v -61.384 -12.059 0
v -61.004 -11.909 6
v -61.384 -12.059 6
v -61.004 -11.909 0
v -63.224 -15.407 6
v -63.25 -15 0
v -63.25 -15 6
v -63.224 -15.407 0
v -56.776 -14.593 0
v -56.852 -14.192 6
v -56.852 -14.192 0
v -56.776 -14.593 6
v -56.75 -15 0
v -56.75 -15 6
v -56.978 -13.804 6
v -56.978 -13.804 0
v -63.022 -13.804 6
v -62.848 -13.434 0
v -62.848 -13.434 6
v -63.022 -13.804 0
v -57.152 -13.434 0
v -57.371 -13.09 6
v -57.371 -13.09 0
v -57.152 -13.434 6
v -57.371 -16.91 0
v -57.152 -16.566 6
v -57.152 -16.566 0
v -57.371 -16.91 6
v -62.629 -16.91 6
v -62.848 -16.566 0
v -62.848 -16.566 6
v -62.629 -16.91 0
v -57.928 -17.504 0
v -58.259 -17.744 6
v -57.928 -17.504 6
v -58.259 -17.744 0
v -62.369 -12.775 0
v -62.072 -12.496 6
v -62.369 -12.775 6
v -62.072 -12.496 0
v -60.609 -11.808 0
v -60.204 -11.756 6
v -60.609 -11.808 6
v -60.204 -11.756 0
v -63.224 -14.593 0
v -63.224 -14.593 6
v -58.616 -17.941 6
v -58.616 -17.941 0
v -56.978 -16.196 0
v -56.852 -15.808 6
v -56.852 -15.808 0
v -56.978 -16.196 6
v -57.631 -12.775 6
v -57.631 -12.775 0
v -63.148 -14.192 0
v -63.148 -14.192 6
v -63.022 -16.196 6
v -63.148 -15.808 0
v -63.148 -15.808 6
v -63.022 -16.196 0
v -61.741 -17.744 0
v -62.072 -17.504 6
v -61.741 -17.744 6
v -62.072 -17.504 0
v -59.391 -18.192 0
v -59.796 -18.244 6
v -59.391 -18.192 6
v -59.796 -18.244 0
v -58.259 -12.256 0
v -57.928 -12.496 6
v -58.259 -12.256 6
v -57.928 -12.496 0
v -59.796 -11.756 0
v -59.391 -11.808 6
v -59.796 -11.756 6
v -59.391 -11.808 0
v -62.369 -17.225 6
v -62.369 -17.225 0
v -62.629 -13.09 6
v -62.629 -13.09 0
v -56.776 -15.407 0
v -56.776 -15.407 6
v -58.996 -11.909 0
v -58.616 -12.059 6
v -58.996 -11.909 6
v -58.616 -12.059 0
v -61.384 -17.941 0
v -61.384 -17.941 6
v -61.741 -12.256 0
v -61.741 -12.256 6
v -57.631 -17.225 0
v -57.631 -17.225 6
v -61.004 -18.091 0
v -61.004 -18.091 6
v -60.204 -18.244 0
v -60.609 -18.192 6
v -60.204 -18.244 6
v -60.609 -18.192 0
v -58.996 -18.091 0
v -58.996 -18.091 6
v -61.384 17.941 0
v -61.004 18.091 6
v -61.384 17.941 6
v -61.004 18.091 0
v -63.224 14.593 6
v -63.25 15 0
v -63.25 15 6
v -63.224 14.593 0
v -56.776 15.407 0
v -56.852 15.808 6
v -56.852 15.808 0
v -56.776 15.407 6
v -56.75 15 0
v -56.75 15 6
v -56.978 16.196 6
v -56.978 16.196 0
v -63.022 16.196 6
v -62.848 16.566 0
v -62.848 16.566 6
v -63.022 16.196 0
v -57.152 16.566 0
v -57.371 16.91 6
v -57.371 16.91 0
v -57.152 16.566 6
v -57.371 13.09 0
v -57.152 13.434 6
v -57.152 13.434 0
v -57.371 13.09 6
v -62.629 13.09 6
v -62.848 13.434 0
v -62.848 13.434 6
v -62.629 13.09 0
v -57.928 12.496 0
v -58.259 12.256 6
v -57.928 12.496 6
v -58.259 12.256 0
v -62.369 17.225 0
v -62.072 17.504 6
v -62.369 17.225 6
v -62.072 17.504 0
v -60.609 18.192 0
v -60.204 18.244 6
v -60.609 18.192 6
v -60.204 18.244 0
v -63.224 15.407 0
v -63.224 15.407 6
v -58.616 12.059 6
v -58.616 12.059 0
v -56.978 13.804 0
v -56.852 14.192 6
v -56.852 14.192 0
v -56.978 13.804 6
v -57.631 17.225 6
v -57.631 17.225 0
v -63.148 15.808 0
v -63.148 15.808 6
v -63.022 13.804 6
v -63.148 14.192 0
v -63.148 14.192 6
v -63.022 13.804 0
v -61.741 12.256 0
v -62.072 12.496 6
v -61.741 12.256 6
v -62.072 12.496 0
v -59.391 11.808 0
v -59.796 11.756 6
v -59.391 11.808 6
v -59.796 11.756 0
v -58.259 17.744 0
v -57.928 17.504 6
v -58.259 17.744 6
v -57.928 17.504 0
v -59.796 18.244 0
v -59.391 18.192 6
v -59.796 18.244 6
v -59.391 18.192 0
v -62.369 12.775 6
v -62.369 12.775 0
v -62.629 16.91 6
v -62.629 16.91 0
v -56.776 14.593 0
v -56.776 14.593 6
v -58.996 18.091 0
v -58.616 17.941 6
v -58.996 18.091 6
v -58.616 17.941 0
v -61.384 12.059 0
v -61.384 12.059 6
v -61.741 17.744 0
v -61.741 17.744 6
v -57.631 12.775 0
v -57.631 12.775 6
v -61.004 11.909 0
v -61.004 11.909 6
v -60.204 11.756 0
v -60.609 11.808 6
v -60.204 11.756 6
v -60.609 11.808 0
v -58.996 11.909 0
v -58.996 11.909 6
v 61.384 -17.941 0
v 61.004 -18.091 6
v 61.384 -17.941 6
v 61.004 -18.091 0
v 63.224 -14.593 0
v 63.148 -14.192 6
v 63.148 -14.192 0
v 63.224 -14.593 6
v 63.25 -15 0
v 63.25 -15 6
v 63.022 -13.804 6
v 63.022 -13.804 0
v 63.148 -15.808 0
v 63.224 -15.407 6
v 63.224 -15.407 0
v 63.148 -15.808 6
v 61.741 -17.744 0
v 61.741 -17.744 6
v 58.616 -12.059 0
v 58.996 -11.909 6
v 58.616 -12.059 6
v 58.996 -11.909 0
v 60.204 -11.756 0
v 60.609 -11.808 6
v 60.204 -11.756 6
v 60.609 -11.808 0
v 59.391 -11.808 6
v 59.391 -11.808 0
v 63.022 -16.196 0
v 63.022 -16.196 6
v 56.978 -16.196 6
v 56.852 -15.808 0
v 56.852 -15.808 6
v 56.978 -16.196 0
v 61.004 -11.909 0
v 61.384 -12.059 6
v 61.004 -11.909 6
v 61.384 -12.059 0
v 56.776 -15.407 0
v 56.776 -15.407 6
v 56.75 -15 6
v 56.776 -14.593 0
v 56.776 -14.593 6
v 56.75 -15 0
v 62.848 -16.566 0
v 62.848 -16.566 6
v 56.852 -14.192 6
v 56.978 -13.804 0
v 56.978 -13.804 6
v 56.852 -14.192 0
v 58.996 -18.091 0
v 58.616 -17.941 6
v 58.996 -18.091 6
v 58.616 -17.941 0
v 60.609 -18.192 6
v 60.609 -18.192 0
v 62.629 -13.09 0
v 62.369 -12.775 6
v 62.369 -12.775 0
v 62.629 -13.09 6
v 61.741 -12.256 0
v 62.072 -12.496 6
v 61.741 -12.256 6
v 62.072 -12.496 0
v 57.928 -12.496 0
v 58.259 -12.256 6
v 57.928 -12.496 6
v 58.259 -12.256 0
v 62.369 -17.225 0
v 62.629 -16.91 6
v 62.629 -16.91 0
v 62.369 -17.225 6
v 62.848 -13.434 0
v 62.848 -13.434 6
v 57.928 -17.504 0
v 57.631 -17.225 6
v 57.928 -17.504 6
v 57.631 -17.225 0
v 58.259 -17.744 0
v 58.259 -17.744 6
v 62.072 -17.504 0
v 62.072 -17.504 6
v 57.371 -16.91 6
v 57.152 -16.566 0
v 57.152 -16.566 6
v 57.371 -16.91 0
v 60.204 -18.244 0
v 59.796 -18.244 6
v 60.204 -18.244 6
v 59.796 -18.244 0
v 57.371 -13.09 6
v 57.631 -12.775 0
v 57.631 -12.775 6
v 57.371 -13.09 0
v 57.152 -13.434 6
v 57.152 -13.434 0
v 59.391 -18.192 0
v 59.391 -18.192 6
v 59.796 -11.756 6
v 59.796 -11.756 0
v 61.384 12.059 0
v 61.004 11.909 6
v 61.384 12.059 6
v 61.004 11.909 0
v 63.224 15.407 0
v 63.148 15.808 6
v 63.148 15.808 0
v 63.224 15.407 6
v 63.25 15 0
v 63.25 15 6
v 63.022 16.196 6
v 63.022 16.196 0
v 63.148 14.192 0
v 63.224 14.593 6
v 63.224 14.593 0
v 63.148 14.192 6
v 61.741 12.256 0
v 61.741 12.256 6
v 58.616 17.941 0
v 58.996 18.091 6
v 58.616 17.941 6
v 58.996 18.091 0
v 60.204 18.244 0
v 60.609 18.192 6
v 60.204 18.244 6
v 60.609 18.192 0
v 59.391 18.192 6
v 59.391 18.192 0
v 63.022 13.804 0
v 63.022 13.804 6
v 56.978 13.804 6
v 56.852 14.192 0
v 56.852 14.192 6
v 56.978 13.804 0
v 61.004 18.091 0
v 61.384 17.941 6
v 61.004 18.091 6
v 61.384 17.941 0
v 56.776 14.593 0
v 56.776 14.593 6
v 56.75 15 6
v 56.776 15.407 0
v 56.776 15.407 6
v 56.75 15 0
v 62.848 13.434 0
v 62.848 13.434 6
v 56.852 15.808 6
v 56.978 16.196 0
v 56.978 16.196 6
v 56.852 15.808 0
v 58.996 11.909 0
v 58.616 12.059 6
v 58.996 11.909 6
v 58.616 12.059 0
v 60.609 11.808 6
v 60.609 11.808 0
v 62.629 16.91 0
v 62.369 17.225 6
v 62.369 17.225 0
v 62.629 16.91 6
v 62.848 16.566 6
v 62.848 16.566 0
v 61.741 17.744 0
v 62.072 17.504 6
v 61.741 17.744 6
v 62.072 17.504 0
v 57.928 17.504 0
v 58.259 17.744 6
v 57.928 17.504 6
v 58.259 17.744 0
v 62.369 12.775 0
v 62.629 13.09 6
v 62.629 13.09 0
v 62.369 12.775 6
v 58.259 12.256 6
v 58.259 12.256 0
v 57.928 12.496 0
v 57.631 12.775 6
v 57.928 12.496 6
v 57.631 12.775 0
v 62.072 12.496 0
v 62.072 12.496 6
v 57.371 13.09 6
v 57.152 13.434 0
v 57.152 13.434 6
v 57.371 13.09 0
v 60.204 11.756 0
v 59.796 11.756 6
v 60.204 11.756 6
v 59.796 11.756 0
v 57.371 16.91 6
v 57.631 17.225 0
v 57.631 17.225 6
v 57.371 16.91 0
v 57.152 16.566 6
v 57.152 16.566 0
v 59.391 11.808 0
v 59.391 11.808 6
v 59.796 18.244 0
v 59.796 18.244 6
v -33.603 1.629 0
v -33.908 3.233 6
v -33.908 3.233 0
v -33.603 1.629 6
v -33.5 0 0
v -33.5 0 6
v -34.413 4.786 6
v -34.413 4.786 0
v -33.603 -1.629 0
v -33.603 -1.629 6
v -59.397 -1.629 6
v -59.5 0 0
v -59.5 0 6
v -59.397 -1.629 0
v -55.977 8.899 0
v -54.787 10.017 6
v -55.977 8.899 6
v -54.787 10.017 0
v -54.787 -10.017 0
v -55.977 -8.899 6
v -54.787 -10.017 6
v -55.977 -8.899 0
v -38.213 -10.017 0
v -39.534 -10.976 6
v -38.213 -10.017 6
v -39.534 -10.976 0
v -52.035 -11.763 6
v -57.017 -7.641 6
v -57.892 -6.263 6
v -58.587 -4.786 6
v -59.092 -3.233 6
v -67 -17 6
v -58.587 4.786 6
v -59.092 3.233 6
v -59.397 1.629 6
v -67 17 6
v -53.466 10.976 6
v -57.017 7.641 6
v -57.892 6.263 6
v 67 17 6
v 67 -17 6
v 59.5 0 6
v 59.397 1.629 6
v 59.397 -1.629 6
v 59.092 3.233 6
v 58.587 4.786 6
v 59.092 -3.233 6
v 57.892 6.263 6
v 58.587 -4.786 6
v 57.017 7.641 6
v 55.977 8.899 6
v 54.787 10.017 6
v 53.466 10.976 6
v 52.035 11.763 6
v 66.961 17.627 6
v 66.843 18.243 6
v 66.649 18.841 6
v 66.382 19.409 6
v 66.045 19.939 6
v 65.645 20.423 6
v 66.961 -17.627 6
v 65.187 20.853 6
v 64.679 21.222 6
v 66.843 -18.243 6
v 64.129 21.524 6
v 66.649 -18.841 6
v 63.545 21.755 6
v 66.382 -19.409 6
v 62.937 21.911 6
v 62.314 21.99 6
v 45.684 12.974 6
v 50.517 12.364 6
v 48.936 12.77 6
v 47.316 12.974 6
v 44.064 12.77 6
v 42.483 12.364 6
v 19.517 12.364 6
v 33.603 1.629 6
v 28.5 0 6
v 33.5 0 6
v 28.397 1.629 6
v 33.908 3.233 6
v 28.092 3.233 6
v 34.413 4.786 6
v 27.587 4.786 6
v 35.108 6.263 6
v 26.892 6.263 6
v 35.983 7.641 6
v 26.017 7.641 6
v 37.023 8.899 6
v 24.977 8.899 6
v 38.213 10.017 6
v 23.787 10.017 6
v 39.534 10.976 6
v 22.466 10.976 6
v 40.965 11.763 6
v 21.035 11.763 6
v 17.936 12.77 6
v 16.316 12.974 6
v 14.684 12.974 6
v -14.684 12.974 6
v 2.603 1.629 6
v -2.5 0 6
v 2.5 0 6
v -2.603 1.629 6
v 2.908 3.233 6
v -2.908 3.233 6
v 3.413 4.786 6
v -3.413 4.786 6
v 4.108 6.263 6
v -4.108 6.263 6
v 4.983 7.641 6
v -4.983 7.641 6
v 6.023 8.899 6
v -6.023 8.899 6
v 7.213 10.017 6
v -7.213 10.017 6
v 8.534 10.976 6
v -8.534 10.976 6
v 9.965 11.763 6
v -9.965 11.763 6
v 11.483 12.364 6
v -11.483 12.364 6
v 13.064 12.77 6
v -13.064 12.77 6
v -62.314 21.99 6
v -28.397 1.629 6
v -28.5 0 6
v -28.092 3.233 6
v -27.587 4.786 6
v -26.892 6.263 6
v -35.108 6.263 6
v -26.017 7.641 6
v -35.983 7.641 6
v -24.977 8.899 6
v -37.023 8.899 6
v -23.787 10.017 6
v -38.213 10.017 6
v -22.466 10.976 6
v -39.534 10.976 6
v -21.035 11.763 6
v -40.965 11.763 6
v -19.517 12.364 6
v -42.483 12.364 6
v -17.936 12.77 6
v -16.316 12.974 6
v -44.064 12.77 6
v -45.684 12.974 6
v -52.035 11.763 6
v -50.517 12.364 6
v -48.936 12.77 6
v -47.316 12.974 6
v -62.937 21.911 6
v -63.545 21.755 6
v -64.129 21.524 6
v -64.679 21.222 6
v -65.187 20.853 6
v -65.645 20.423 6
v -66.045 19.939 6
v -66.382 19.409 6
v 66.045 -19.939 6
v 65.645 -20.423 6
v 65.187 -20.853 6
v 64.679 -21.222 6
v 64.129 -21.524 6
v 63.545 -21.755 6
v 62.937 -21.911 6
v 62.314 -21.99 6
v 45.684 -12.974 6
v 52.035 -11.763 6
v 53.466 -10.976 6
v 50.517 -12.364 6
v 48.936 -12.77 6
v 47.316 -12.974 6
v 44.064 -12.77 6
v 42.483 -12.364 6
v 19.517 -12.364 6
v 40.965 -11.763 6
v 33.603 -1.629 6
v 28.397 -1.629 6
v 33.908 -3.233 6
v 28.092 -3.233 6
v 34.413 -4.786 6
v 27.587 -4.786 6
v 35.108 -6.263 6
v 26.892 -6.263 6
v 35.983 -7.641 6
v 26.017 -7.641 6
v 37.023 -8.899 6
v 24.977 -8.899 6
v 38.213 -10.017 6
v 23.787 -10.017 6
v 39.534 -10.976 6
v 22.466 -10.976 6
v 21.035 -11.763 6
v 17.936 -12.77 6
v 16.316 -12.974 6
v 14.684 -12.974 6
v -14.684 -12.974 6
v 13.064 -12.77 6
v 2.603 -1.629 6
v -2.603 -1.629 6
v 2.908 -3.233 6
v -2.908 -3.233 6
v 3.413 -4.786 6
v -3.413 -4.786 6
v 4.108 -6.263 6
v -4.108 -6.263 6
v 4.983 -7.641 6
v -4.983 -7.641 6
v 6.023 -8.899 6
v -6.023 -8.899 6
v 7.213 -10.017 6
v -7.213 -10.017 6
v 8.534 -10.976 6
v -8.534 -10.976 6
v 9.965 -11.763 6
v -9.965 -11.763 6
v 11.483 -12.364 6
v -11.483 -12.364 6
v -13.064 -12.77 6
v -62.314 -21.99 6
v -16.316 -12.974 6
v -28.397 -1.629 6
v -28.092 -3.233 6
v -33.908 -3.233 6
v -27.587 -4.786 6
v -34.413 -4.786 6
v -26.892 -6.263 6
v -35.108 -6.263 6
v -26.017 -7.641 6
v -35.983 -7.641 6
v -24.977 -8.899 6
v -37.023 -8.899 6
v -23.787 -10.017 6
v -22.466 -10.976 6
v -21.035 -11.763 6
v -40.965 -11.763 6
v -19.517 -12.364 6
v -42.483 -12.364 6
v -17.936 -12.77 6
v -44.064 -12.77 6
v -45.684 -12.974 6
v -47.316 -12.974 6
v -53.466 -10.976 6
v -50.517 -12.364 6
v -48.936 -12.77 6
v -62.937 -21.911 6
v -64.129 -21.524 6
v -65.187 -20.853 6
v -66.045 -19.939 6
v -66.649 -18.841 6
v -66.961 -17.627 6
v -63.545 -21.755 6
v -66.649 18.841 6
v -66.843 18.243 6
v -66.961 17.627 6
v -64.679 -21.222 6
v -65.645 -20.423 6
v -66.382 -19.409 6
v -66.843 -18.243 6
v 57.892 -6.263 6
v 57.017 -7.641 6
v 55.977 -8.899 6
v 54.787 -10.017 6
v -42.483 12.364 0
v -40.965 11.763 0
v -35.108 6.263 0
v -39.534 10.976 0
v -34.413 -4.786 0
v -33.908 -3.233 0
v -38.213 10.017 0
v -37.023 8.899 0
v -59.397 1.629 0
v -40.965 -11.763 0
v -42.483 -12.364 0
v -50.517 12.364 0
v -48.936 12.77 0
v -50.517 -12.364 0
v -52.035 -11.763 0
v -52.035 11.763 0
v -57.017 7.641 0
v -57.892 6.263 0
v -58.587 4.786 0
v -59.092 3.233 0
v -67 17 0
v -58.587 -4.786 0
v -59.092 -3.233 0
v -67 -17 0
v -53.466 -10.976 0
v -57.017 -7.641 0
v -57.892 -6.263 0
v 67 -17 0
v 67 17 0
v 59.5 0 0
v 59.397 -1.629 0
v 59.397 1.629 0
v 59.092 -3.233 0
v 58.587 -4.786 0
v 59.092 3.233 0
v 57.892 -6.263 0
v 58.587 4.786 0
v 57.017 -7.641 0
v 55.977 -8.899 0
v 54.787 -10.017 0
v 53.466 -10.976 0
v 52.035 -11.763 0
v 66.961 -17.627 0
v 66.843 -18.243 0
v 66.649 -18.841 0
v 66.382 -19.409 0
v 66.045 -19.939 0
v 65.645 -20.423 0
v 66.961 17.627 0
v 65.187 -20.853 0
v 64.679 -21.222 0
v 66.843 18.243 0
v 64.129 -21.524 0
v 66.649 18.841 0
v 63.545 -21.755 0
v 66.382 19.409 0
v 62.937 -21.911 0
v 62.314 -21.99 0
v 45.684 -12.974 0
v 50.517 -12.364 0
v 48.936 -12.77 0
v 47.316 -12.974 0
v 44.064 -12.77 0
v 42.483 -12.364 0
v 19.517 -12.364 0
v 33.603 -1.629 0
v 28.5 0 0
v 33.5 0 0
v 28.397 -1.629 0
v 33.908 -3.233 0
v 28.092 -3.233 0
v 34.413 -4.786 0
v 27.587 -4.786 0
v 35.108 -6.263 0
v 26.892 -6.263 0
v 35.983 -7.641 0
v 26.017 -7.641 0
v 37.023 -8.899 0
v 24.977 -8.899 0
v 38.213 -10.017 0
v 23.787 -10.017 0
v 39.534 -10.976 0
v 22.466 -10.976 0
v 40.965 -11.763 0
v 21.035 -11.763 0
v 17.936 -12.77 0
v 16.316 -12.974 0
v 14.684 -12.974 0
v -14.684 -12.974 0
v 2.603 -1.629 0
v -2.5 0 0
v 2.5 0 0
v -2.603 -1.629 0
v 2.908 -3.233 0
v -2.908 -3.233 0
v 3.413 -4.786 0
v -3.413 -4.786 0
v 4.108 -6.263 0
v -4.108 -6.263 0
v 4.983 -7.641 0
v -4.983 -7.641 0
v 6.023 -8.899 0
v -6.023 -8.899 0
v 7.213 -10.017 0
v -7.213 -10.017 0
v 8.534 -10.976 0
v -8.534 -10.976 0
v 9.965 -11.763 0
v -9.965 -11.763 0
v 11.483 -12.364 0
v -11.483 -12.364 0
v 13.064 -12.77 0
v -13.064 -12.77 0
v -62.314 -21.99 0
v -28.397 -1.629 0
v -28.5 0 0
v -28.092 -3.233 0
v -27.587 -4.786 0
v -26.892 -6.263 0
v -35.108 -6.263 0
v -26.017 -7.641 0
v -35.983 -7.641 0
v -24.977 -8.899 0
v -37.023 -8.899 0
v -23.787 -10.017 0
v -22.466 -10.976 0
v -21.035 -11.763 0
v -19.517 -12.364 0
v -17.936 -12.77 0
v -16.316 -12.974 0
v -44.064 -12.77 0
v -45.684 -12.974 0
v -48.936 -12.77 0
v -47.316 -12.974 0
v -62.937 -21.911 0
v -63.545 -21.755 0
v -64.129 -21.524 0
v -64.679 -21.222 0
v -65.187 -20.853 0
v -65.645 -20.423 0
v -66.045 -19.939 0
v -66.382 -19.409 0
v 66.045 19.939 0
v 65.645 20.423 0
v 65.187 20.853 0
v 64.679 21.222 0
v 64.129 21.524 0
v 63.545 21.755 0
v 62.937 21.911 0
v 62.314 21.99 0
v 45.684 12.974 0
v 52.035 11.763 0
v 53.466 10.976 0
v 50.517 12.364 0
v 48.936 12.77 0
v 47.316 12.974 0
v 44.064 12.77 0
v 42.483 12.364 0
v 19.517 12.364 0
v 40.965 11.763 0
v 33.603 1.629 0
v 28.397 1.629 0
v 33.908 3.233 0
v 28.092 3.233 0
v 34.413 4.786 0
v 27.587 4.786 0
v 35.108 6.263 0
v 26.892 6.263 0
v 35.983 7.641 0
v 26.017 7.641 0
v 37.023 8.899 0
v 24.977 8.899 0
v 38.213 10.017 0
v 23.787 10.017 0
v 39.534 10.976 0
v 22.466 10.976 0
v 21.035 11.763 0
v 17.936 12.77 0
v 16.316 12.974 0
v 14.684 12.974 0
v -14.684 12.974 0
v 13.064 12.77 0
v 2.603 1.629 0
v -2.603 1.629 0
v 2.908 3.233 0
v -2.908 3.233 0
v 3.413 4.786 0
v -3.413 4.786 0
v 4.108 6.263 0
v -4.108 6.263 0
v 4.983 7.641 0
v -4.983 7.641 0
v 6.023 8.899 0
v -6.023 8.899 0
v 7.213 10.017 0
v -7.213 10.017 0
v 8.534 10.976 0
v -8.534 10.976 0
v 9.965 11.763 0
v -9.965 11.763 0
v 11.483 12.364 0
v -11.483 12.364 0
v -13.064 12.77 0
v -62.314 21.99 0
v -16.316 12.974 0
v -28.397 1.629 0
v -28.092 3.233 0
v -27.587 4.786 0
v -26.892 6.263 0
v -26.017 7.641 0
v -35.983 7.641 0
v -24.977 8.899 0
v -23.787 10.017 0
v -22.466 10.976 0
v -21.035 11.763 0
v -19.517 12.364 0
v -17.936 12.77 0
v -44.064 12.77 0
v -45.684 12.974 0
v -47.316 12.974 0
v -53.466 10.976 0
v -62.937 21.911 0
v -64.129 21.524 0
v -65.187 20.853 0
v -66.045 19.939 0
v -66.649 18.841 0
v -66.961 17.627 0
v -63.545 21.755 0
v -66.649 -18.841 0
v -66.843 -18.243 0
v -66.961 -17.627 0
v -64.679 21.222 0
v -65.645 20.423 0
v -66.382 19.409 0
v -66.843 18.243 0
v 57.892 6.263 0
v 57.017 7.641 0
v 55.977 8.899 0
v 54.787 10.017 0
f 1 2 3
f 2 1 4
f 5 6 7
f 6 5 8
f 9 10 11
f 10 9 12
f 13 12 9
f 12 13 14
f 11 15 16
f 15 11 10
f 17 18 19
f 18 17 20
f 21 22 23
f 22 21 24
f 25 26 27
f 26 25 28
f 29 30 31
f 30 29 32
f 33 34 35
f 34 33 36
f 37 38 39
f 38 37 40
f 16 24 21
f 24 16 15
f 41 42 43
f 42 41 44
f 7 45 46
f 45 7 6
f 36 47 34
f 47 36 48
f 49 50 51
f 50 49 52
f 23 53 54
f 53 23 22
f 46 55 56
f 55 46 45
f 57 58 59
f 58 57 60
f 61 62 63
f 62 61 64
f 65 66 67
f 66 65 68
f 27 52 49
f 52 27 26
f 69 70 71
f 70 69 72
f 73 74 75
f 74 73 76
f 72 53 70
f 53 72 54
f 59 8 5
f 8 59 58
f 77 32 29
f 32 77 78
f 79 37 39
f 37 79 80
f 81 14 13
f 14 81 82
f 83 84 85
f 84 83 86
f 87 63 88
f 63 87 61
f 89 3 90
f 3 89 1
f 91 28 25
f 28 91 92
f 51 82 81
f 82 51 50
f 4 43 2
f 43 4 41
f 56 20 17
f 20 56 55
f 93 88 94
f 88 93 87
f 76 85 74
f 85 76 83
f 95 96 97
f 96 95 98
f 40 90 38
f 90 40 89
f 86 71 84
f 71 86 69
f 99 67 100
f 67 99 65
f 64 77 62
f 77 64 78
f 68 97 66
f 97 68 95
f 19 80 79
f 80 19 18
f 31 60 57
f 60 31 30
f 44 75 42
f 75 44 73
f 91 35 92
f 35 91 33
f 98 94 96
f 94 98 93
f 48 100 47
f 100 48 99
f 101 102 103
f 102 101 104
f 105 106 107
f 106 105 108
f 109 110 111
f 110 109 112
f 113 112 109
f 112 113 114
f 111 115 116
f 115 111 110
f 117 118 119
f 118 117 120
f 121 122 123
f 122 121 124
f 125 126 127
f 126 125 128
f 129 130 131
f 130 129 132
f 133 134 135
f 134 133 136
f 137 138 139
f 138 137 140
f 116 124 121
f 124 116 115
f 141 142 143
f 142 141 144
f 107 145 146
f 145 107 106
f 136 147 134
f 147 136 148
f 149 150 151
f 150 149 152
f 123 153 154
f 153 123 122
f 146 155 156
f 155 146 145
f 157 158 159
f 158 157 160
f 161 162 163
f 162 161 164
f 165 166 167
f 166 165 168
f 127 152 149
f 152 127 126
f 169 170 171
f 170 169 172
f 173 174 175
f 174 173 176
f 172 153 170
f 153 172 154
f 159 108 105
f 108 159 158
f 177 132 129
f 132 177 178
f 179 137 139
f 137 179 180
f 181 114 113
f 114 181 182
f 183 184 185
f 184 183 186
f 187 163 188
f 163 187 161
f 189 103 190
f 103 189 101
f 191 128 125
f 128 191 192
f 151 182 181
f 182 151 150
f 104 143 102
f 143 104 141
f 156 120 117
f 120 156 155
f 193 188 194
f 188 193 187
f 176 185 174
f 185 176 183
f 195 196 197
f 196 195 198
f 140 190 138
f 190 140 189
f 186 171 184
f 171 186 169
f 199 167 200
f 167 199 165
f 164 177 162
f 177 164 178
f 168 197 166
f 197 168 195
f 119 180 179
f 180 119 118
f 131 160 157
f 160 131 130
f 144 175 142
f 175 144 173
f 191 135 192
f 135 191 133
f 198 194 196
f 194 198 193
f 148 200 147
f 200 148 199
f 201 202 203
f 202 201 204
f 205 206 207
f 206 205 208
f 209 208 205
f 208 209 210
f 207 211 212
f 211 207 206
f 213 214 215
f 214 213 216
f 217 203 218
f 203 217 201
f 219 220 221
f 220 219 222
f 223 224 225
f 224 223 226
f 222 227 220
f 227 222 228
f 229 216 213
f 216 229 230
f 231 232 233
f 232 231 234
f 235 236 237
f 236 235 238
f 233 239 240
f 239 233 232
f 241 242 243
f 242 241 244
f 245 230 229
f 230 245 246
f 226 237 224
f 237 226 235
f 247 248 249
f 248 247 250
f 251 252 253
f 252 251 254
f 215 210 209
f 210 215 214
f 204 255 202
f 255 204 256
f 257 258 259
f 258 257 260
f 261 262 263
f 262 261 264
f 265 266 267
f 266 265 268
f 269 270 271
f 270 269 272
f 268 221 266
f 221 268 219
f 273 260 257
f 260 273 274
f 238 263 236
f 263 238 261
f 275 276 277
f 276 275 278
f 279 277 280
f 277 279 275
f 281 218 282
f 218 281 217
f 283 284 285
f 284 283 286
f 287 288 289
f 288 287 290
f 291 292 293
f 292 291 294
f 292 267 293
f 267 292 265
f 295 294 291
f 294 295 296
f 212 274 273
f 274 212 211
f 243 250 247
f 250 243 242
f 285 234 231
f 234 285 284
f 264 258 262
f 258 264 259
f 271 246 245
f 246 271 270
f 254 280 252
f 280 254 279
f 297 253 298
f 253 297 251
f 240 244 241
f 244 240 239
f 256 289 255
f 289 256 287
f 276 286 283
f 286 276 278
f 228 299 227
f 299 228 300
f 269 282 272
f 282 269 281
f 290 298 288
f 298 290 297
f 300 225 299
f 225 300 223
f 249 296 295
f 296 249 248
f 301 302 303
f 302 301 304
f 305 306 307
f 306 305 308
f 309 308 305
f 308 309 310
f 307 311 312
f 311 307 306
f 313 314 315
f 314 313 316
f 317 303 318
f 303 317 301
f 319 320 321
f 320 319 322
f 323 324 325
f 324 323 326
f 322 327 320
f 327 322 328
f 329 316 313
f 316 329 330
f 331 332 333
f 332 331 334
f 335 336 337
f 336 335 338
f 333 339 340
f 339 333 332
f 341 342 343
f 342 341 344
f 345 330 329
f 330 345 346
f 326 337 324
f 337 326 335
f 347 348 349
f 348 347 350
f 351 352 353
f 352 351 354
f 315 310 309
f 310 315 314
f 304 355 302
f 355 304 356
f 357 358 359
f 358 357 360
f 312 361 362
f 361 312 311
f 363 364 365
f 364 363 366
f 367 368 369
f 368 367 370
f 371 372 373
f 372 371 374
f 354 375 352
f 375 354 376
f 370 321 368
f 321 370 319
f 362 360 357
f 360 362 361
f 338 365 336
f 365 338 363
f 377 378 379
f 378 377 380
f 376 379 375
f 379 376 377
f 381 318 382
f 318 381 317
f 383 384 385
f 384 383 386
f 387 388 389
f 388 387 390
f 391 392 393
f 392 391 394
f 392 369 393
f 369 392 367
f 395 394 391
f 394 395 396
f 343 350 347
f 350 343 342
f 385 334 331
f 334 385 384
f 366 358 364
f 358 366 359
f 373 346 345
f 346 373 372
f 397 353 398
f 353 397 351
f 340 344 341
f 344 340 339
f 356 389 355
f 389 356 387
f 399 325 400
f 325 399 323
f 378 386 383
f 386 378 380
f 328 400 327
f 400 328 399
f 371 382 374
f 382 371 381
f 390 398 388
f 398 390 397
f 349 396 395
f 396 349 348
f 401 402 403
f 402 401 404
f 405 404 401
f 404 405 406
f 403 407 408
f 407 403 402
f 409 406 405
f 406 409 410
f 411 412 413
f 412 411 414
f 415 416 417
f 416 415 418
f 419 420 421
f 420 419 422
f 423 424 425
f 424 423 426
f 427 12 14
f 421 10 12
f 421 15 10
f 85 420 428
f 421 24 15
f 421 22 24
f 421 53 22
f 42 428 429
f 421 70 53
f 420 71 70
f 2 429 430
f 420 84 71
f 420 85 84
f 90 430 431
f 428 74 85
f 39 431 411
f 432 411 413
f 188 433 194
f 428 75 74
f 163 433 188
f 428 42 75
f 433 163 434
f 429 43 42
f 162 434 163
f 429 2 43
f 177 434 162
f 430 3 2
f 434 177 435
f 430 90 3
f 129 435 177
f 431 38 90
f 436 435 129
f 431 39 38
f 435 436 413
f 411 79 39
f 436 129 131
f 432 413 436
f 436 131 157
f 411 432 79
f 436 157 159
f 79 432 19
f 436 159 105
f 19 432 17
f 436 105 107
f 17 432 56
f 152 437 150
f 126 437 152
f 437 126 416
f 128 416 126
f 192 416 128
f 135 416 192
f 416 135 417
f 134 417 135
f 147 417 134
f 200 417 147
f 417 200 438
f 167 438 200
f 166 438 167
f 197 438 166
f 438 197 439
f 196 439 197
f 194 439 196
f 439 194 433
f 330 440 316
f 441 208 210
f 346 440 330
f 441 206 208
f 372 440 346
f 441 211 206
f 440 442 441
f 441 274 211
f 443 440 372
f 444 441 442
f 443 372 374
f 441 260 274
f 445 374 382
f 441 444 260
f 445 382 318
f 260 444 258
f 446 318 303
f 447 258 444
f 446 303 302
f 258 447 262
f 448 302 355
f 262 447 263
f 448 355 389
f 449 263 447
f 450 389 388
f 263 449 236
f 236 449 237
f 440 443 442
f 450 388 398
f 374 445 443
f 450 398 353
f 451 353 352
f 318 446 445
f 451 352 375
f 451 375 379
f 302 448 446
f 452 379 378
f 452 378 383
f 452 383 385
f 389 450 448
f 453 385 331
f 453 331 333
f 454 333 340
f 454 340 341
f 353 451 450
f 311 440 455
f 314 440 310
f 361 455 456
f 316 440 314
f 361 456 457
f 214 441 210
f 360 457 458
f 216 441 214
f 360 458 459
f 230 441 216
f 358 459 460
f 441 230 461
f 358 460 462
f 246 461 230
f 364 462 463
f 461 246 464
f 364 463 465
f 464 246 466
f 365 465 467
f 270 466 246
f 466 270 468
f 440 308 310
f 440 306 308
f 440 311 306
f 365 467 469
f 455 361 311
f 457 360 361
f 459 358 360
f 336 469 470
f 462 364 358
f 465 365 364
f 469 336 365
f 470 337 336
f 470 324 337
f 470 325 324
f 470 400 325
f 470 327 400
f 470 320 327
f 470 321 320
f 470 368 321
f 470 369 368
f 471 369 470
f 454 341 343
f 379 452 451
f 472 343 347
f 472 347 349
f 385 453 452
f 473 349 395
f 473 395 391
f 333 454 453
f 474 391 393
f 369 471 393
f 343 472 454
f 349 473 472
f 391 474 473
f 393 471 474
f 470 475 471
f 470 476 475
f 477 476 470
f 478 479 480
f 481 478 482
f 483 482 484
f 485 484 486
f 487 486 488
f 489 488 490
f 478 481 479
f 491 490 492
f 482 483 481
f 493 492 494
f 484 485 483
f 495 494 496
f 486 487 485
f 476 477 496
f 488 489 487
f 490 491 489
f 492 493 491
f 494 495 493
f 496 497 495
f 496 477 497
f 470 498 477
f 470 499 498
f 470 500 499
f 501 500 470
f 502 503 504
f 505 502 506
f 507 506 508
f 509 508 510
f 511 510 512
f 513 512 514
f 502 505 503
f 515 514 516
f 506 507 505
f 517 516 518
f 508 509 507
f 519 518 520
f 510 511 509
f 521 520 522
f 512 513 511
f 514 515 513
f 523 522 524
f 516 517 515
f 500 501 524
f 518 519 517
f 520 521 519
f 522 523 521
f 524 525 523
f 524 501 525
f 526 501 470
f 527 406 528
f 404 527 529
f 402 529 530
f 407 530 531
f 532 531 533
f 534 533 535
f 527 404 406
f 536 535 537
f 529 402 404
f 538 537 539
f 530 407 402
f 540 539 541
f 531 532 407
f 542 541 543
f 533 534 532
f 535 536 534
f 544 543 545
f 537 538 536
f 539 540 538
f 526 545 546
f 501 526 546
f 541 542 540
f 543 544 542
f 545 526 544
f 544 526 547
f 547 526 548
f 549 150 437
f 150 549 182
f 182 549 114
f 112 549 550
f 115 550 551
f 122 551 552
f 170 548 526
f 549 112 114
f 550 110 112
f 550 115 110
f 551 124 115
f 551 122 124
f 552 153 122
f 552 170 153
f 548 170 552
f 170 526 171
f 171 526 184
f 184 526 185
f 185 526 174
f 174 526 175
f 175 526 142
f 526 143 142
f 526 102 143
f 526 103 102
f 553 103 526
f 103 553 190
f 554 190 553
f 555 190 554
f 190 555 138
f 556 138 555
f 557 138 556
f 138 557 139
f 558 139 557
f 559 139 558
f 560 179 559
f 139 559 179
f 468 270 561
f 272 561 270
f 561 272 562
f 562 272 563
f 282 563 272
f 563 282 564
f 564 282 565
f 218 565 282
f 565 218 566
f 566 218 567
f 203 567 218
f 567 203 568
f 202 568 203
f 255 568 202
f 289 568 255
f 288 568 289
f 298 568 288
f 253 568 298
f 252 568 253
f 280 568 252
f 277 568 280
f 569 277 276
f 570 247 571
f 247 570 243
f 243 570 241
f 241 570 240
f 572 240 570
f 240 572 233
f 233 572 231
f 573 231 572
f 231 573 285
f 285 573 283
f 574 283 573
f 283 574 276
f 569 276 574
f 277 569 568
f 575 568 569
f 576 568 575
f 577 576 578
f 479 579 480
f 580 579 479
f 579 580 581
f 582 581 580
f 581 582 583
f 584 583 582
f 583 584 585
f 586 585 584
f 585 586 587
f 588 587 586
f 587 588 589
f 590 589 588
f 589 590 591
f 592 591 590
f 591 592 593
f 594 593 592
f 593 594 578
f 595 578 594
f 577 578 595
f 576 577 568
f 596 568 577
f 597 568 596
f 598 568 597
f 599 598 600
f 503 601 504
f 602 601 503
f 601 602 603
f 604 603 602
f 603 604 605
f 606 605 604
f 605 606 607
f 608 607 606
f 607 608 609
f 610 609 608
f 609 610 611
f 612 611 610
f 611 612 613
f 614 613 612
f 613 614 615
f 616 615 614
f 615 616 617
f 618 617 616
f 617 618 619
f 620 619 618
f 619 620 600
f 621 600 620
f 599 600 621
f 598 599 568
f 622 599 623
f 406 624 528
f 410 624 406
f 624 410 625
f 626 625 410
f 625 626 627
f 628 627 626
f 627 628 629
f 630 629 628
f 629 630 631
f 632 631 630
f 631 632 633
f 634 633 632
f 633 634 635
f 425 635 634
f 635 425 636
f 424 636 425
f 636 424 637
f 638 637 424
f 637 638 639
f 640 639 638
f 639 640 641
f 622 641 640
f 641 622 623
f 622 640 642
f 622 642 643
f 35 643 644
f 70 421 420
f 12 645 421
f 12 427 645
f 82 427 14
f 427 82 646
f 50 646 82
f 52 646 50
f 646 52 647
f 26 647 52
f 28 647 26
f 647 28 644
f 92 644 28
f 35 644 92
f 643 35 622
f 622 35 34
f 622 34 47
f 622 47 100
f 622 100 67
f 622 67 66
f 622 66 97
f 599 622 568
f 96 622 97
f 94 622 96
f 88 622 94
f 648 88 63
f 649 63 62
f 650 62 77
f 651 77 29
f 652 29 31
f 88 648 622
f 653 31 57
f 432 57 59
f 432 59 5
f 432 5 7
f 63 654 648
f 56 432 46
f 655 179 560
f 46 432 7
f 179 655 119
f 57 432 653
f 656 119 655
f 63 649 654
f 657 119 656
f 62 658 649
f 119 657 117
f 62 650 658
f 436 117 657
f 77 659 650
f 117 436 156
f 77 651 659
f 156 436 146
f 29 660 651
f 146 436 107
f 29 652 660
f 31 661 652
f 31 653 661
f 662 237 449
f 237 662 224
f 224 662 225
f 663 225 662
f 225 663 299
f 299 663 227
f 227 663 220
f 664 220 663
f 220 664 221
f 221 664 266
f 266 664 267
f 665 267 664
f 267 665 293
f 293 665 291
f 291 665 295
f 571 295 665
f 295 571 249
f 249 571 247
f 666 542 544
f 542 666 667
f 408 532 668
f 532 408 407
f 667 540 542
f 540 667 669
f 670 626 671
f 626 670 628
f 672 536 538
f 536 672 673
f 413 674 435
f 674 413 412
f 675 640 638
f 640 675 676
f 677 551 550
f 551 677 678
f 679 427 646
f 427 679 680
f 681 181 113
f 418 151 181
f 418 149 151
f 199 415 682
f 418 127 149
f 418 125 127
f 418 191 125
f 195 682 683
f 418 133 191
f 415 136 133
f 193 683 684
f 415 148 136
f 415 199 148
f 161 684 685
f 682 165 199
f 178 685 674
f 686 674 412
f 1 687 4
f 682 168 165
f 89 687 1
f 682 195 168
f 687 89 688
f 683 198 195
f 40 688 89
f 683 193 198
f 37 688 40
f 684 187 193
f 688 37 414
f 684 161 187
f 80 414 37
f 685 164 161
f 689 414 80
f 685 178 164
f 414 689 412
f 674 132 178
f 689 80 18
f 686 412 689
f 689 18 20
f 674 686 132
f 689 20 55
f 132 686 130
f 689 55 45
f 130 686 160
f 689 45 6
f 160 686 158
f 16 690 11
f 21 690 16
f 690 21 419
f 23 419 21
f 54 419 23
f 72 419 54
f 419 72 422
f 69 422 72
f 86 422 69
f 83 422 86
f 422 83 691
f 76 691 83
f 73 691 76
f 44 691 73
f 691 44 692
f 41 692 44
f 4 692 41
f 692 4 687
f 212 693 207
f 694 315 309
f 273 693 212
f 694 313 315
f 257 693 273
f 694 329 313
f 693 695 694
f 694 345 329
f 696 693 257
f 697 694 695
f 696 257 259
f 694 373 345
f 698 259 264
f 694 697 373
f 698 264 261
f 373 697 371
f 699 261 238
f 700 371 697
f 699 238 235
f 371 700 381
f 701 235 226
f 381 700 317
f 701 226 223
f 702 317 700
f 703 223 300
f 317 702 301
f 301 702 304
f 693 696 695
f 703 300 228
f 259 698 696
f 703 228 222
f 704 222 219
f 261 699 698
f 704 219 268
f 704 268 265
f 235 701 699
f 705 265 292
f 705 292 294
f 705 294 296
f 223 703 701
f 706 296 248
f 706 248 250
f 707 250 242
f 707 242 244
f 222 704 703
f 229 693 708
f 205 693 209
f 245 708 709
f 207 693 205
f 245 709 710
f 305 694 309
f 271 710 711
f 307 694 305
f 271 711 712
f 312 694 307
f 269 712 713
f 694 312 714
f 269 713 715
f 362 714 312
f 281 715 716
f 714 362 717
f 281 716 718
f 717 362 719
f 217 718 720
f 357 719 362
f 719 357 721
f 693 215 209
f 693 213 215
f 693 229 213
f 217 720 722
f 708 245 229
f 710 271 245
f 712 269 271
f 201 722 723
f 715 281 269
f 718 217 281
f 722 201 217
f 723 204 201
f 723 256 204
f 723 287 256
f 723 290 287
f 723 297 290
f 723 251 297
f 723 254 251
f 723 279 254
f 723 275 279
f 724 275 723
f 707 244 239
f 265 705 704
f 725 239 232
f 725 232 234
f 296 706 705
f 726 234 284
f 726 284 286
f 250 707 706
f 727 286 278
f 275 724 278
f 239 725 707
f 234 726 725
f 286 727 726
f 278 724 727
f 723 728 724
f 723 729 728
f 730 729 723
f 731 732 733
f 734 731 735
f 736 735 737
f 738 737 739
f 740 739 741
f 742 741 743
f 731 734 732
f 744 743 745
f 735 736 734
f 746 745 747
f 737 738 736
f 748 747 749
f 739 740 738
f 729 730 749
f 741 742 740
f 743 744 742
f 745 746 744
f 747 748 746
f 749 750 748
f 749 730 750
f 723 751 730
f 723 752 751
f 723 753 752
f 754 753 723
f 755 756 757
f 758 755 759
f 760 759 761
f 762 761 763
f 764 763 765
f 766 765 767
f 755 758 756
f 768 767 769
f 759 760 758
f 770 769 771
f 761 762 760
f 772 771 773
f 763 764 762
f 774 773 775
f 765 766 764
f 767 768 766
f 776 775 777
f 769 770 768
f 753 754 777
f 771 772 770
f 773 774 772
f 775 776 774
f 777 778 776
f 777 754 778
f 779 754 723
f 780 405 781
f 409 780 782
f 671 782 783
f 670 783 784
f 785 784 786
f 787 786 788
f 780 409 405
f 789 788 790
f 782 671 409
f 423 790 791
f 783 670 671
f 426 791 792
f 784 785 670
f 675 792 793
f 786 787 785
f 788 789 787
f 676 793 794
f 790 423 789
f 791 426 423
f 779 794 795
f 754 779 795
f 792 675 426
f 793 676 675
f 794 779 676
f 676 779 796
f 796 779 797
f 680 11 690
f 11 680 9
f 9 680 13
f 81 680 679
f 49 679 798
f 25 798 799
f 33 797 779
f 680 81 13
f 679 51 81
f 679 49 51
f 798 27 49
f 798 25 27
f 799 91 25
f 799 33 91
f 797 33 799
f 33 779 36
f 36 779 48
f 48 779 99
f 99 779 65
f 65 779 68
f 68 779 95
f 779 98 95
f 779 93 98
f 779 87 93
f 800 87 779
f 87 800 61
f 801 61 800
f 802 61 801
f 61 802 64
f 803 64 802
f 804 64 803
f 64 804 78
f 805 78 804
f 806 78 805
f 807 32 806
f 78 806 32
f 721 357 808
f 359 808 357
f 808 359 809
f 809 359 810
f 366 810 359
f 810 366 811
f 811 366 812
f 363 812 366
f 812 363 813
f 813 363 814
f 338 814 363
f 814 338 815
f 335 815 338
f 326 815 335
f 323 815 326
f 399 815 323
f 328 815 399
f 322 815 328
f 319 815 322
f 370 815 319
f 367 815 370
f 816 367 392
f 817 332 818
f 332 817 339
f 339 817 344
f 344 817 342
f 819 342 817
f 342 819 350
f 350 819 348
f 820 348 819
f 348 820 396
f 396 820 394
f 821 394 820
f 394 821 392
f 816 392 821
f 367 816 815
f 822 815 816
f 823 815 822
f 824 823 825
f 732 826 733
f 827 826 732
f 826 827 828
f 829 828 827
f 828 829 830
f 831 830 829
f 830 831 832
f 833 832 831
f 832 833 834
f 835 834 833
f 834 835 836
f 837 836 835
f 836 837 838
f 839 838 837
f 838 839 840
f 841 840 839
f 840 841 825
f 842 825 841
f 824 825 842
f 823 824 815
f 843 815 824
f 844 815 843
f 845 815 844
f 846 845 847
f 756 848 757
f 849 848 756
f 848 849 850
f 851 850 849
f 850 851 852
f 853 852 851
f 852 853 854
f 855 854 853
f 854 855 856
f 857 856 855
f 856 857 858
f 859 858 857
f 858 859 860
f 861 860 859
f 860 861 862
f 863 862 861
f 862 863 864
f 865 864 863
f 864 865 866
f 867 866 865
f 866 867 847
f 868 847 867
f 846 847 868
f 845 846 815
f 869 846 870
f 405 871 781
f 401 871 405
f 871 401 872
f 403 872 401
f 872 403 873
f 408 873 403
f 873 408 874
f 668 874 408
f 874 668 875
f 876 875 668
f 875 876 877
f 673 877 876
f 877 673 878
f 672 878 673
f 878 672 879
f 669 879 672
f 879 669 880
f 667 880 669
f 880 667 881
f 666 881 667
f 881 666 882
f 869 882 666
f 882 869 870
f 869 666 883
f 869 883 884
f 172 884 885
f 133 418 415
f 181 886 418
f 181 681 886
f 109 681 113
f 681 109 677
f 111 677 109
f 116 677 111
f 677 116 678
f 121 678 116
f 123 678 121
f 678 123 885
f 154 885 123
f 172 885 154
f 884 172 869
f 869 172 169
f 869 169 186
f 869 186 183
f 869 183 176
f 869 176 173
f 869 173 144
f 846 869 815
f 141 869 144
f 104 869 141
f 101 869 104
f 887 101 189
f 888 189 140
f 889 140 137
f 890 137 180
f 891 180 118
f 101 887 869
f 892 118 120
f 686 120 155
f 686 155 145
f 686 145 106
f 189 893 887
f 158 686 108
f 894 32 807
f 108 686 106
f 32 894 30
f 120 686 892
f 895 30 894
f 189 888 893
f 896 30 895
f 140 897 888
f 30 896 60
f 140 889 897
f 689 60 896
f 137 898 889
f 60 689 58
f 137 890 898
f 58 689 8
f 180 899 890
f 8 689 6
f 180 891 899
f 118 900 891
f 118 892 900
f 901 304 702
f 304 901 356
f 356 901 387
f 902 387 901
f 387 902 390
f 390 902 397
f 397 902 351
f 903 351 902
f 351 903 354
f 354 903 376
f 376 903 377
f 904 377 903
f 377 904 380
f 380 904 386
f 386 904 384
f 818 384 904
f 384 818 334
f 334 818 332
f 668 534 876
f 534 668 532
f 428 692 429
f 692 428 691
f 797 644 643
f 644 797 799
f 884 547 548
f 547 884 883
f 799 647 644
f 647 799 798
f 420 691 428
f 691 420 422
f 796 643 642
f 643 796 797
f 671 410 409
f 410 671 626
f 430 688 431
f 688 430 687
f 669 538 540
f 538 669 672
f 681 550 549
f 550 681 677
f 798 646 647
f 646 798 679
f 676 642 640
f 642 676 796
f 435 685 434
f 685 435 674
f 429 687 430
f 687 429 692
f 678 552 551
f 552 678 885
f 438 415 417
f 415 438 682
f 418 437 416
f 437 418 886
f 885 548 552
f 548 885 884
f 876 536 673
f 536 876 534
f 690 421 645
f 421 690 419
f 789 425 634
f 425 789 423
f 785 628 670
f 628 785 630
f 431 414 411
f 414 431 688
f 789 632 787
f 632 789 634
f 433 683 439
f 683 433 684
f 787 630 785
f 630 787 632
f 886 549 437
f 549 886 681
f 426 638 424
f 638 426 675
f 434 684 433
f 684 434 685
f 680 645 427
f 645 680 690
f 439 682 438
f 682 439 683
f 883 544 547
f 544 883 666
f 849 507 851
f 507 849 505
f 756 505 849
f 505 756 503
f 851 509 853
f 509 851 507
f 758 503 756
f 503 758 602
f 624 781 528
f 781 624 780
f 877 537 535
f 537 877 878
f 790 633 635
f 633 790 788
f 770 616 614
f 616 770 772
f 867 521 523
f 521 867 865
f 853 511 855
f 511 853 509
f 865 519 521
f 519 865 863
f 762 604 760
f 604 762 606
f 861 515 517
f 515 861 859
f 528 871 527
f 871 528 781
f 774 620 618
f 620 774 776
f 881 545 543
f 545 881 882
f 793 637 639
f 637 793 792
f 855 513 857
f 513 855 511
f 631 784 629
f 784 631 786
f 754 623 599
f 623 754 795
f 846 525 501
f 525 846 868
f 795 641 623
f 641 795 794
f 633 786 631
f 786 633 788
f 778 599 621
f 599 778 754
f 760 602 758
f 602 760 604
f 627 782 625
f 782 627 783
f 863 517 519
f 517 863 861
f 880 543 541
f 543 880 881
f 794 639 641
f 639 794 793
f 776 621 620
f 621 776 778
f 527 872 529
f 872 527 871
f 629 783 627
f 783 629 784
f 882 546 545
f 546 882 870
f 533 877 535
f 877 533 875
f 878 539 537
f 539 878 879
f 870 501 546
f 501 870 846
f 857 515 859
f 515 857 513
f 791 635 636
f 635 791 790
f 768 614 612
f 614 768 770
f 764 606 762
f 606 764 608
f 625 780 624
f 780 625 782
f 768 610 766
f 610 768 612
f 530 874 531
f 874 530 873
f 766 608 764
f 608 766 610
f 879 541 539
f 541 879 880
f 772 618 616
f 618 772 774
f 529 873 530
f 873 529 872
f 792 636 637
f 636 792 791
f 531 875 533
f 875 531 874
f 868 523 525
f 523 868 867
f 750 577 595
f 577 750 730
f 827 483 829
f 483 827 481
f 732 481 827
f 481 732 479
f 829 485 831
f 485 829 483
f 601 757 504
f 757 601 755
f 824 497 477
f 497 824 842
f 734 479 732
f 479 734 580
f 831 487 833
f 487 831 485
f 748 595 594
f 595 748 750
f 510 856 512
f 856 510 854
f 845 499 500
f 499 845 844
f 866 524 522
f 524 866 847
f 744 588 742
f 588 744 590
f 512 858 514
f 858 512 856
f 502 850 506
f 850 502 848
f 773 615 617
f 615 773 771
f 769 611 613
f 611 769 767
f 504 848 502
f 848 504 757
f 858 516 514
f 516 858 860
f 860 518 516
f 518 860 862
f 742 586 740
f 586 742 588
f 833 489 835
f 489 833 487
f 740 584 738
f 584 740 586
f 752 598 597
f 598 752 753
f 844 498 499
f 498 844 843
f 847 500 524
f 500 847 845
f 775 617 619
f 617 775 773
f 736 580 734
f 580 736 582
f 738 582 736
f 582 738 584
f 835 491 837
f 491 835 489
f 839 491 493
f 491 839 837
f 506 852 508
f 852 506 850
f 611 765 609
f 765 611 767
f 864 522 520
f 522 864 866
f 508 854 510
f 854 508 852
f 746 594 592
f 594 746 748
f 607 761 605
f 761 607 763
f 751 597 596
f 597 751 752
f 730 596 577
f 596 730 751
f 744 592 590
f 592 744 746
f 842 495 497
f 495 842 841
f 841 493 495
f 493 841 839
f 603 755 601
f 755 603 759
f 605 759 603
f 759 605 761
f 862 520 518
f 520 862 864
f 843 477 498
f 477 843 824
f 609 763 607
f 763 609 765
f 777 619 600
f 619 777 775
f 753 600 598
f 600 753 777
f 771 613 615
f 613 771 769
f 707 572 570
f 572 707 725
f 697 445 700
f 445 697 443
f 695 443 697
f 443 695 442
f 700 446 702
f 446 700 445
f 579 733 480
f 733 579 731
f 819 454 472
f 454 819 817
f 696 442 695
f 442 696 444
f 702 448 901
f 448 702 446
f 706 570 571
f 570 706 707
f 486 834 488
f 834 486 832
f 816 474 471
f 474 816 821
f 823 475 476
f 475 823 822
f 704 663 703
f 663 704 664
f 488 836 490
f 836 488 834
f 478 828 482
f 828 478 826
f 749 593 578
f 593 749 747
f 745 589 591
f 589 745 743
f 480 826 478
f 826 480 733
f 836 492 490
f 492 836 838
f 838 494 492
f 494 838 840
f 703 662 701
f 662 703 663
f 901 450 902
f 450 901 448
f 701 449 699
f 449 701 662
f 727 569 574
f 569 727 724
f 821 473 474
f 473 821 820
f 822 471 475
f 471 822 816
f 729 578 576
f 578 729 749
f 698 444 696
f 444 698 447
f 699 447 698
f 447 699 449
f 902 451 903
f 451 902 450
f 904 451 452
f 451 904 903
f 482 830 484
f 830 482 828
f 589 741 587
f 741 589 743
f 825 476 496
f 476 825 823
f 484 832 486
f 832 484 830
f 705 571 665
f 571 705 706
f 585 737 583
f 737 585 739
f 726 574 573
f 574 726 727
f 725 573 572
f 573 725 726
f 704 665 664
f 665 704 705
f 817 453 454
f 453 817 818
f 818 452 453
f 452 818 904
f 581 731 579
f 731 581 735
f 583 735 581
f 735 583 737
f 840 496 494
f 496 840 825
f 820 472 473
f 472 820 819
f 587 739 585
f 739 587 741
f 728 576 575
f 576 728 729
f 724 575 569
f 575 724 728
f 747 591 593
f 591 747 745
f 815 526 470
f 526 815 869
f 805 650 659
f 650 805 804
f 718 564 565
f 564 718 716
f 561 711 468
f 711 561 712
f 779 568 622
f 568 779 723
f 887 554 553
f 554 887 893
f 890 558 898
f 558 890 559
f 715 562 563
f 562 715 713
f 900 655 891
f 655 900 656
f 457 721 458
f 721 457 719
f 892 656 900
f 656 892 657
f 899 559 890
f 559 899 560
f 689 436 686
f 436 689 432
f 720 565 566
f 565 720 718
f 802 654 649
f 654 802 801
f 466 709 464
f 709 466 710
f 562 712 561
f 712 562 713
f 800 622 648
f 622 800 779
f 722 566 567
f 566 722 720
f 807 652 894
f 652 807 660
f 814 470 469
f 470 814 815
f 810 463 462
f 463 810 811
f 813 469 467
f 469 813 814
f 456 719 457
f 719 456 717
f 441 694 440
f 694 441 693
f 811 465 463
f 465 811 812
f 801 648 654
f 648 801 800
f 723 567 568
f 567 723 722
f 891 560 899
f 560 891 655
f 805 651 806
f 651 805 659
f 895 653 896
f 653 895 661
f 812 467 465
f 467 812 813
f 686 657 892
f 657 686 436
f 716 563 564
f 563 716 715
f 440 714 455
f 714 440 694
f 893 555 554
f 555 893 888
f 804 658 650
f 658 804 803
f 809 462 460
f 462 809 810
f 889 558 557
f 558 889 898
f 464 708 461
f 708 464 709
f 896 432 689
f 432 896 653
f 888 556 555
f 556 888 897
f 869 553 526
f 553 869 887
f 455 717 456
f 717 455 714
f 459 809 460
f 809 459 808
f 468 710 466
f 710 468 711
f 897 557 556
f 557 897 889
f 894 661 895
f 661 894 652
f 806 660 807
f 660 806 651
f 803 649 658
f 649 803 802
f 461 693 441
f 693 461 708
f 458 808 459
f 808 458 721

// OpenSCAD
$fn = 50;


difference() {
	union() {
		hull() {
			translate(v = [-62.0000000000, 17.0000000000, 0]) {
				cylinder(h = 6, r = 5);
			}
			translate(v = [62.0000000000, 17.0000000000, 0]) {
				cylinder(h = 6, r = 5);
			}
			translate(v = [-62.0000000000, -17.0000000000, 0]) {
				cylinder(h = 6, r = 5);
			}
			translate(v = [62.0000000000, -17.0000000000, 0]) {
				cylinder(h = 6, r = 5);
			}
		}
	}
	union() {
		#translate(v = [-60.0000000000, -15.0000000000, -100.0000000000]) {
			cylinder(h = 200, r = 3.2500000000);
		}
		#translate(v = [-60.0000000000, 15.0000000000, -100.0000000000]) {
			cylinder(h = 200, r = 3.2500000000);
		}
		#translate(v = [60.0000000000, -15.0000000000, -100.0000000000]) {
			cylinder(h = 200, r = 3.2500000000);
		}
		#translate(v = [60.0000000000, 15.0000000000, -100.0000000000]) {
			cylinder(h = 200, r = 3.2500000000);
		}
		#translate(v = [-46.5000000000, 0, 0]) {
			cylinder(h = 6, r = 13.0000000000);
		}
		#translate(v = [-15.5000000000, 0, 0]) {
			cylinder(h = 6, r = 13.0000000000);
		}
		#translate(v = [15.5000000000, 0, 0]) {
			cylinder(h = 6, r = 13.0000000000);
		}
		#translate(v = [46.5000000000, 0, 0]) {
			cylinder(h = 6, r = 13.0000000000);
		}
	}
}
